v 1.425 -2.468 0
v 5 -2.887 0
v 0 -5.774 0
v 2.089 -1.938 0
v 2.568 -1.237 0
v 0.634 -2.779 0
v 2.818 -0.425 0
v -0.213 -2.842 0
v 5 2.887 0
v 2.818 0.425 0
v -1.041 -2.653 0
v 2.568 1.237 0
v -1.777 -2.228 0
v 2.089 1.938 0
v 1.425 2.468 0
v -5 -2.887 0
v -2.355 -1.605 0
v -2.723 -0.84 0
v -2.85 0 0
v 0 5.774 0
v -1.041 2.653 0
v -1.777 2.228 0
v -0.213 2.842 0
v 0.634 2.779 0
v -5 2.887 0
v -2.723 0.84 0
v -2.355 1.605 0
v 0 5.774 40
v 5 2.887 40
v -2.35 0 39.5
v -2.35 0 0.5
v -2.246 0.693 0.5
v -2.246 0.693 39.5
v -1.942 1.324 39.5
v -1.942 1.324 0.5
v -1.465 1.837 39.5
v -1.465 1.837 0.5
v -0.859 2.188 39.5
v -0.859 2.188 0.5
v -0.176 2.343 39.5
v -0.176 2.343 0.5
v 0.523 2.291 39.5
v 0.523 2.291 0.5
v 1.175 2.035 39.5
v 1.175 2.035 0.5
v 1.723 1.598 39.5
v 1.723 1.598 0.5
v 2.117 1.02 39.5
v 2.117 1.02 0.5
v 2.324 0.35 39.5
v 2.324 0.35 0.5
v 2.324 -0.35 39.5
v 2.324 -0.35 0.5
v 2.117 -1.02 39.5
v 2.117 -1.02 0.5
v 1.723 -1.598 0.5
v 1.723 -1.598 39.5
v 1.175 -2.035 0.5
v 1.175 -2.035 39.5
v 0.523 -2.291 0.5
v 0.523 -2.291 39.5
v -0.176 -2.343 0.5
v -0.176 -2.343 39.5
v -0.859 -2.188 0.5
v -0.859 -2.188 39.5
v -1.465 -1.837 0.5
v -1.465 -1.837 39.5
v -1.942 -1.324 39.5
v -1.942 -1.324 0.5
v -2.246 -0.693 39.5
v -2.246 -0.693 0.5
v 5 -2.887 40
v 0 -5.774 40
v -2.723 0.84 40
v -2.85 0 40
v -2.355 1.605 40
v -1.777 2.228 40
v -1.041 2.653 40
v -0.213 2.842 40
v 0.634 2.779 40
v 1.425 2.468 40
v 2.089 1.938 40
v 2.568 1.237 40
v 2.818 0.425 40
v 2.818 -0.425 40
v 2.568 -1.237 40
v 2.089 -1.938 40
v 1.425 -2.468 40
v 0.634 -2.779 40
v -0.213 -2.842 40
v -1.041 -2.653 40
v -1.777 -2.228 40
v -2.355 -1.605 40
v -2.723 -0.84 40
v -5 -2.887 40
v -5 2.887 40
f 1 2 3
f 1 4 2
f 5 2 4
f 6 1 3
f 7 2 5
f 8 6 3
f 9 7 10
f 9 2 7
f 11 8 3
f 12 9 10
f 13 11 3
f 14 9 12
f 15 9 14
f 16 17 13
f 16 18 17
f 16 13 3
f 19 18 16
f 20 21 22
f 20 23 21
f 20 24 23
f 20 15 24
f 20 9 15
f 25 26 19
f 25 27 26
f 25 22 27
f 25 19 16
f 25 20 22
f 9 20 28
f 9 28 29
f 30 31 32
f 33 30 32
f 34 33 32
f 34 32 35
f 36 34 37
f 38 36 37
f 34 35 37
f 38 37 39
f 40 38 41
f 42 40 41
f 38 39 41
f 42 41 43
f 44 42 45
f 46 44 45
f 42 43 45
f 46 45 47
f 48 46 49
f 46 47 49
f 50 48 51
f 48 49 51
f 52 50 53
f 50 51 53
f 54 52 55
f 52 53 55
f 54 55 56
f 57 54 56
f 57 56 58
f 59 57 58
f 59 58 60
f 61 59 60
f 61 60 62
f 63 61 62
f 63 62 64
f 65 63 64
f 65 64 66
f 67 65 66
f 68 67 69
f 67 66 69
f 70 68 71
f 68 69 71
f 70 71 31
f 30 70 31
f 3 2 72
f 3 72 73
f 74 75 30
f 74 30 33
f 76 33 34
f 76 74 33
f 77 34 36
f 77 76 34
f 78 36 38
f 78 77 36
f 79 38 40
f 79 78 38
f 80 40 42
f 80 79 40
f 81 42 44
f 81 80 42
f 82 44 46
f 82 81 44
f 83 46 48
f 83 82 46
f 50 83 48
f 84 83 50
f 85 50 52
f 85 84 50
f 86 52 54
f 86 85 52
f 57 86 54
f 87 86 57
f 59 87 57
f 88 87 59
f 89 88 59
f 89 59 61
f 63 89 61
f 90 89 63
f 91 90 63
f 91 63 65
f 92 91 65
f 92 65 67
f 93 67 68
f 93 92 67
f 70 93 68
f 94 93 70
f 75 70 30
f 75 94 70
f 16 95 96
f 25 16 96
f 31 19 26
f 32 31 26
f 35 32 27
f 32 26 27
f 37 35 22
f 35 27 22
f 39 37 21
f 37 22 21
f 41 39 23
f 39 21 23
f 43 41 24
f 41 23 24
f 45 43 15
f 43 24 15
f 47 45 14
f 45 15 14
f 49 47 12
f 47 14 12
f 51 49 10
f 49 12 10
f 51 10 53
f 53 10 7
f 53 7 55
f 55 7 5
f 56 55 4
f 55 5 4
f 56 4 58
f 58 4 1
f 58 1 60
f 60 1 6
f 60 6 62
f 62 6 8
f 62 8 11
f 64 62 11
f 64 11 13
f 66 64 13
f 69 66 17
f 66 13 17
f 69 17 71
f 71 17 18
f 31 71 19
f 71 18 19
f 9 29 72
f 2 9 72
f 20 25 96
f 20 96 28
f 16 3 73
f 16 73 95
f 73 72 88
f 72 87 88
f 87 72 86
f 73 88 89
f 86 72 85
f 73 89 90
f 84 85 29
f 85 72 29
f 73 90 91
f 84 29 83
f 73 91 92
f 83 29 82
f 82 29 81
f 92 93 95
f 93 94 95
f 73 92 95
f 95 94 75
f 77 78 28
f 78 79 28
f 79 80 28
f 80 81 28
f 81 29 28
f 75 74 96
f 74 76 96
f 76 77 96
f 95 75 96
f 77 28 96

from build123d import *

# Parameters (mm, degrees)
SKETCH1_R           = 2.35
BOSS_EXTRUDE1_DEPTH = 40
CHAMFER4_SIZE       = 0.5


with BuildPart() as part:
    # Sketch1 → Boss-Extrude1 (new body)
    with BuildSketch(Plane(origin=(0, 0, 0), x_dir=(-1, 0, 0), z_dir=(0, 0, -1))):
        Polygon((-5.000000075, 2.886751389), (-5.000000075, -2.886751389), (0, -5.773502778), (5.000000075, -2.886751389), (5.000000075, 2.886751389), (0, 5.773502778), align=None)
        Circle(SKETCH1_R, mode=Mode.SUBTRACT)
    extrude(amount=-BOSS_EXTRUDE1_DEPTH)

    # Chamfer4
    chamfer4_edges = [part.edges().sort_by_distance(p)[0] for p in [
        (2.35, 0, 40),
        (2.35, 0, 0),
    ]]
    chamfer(chamfer4_edges, length=CHAMFER4_SIZE)


solid = part.part
